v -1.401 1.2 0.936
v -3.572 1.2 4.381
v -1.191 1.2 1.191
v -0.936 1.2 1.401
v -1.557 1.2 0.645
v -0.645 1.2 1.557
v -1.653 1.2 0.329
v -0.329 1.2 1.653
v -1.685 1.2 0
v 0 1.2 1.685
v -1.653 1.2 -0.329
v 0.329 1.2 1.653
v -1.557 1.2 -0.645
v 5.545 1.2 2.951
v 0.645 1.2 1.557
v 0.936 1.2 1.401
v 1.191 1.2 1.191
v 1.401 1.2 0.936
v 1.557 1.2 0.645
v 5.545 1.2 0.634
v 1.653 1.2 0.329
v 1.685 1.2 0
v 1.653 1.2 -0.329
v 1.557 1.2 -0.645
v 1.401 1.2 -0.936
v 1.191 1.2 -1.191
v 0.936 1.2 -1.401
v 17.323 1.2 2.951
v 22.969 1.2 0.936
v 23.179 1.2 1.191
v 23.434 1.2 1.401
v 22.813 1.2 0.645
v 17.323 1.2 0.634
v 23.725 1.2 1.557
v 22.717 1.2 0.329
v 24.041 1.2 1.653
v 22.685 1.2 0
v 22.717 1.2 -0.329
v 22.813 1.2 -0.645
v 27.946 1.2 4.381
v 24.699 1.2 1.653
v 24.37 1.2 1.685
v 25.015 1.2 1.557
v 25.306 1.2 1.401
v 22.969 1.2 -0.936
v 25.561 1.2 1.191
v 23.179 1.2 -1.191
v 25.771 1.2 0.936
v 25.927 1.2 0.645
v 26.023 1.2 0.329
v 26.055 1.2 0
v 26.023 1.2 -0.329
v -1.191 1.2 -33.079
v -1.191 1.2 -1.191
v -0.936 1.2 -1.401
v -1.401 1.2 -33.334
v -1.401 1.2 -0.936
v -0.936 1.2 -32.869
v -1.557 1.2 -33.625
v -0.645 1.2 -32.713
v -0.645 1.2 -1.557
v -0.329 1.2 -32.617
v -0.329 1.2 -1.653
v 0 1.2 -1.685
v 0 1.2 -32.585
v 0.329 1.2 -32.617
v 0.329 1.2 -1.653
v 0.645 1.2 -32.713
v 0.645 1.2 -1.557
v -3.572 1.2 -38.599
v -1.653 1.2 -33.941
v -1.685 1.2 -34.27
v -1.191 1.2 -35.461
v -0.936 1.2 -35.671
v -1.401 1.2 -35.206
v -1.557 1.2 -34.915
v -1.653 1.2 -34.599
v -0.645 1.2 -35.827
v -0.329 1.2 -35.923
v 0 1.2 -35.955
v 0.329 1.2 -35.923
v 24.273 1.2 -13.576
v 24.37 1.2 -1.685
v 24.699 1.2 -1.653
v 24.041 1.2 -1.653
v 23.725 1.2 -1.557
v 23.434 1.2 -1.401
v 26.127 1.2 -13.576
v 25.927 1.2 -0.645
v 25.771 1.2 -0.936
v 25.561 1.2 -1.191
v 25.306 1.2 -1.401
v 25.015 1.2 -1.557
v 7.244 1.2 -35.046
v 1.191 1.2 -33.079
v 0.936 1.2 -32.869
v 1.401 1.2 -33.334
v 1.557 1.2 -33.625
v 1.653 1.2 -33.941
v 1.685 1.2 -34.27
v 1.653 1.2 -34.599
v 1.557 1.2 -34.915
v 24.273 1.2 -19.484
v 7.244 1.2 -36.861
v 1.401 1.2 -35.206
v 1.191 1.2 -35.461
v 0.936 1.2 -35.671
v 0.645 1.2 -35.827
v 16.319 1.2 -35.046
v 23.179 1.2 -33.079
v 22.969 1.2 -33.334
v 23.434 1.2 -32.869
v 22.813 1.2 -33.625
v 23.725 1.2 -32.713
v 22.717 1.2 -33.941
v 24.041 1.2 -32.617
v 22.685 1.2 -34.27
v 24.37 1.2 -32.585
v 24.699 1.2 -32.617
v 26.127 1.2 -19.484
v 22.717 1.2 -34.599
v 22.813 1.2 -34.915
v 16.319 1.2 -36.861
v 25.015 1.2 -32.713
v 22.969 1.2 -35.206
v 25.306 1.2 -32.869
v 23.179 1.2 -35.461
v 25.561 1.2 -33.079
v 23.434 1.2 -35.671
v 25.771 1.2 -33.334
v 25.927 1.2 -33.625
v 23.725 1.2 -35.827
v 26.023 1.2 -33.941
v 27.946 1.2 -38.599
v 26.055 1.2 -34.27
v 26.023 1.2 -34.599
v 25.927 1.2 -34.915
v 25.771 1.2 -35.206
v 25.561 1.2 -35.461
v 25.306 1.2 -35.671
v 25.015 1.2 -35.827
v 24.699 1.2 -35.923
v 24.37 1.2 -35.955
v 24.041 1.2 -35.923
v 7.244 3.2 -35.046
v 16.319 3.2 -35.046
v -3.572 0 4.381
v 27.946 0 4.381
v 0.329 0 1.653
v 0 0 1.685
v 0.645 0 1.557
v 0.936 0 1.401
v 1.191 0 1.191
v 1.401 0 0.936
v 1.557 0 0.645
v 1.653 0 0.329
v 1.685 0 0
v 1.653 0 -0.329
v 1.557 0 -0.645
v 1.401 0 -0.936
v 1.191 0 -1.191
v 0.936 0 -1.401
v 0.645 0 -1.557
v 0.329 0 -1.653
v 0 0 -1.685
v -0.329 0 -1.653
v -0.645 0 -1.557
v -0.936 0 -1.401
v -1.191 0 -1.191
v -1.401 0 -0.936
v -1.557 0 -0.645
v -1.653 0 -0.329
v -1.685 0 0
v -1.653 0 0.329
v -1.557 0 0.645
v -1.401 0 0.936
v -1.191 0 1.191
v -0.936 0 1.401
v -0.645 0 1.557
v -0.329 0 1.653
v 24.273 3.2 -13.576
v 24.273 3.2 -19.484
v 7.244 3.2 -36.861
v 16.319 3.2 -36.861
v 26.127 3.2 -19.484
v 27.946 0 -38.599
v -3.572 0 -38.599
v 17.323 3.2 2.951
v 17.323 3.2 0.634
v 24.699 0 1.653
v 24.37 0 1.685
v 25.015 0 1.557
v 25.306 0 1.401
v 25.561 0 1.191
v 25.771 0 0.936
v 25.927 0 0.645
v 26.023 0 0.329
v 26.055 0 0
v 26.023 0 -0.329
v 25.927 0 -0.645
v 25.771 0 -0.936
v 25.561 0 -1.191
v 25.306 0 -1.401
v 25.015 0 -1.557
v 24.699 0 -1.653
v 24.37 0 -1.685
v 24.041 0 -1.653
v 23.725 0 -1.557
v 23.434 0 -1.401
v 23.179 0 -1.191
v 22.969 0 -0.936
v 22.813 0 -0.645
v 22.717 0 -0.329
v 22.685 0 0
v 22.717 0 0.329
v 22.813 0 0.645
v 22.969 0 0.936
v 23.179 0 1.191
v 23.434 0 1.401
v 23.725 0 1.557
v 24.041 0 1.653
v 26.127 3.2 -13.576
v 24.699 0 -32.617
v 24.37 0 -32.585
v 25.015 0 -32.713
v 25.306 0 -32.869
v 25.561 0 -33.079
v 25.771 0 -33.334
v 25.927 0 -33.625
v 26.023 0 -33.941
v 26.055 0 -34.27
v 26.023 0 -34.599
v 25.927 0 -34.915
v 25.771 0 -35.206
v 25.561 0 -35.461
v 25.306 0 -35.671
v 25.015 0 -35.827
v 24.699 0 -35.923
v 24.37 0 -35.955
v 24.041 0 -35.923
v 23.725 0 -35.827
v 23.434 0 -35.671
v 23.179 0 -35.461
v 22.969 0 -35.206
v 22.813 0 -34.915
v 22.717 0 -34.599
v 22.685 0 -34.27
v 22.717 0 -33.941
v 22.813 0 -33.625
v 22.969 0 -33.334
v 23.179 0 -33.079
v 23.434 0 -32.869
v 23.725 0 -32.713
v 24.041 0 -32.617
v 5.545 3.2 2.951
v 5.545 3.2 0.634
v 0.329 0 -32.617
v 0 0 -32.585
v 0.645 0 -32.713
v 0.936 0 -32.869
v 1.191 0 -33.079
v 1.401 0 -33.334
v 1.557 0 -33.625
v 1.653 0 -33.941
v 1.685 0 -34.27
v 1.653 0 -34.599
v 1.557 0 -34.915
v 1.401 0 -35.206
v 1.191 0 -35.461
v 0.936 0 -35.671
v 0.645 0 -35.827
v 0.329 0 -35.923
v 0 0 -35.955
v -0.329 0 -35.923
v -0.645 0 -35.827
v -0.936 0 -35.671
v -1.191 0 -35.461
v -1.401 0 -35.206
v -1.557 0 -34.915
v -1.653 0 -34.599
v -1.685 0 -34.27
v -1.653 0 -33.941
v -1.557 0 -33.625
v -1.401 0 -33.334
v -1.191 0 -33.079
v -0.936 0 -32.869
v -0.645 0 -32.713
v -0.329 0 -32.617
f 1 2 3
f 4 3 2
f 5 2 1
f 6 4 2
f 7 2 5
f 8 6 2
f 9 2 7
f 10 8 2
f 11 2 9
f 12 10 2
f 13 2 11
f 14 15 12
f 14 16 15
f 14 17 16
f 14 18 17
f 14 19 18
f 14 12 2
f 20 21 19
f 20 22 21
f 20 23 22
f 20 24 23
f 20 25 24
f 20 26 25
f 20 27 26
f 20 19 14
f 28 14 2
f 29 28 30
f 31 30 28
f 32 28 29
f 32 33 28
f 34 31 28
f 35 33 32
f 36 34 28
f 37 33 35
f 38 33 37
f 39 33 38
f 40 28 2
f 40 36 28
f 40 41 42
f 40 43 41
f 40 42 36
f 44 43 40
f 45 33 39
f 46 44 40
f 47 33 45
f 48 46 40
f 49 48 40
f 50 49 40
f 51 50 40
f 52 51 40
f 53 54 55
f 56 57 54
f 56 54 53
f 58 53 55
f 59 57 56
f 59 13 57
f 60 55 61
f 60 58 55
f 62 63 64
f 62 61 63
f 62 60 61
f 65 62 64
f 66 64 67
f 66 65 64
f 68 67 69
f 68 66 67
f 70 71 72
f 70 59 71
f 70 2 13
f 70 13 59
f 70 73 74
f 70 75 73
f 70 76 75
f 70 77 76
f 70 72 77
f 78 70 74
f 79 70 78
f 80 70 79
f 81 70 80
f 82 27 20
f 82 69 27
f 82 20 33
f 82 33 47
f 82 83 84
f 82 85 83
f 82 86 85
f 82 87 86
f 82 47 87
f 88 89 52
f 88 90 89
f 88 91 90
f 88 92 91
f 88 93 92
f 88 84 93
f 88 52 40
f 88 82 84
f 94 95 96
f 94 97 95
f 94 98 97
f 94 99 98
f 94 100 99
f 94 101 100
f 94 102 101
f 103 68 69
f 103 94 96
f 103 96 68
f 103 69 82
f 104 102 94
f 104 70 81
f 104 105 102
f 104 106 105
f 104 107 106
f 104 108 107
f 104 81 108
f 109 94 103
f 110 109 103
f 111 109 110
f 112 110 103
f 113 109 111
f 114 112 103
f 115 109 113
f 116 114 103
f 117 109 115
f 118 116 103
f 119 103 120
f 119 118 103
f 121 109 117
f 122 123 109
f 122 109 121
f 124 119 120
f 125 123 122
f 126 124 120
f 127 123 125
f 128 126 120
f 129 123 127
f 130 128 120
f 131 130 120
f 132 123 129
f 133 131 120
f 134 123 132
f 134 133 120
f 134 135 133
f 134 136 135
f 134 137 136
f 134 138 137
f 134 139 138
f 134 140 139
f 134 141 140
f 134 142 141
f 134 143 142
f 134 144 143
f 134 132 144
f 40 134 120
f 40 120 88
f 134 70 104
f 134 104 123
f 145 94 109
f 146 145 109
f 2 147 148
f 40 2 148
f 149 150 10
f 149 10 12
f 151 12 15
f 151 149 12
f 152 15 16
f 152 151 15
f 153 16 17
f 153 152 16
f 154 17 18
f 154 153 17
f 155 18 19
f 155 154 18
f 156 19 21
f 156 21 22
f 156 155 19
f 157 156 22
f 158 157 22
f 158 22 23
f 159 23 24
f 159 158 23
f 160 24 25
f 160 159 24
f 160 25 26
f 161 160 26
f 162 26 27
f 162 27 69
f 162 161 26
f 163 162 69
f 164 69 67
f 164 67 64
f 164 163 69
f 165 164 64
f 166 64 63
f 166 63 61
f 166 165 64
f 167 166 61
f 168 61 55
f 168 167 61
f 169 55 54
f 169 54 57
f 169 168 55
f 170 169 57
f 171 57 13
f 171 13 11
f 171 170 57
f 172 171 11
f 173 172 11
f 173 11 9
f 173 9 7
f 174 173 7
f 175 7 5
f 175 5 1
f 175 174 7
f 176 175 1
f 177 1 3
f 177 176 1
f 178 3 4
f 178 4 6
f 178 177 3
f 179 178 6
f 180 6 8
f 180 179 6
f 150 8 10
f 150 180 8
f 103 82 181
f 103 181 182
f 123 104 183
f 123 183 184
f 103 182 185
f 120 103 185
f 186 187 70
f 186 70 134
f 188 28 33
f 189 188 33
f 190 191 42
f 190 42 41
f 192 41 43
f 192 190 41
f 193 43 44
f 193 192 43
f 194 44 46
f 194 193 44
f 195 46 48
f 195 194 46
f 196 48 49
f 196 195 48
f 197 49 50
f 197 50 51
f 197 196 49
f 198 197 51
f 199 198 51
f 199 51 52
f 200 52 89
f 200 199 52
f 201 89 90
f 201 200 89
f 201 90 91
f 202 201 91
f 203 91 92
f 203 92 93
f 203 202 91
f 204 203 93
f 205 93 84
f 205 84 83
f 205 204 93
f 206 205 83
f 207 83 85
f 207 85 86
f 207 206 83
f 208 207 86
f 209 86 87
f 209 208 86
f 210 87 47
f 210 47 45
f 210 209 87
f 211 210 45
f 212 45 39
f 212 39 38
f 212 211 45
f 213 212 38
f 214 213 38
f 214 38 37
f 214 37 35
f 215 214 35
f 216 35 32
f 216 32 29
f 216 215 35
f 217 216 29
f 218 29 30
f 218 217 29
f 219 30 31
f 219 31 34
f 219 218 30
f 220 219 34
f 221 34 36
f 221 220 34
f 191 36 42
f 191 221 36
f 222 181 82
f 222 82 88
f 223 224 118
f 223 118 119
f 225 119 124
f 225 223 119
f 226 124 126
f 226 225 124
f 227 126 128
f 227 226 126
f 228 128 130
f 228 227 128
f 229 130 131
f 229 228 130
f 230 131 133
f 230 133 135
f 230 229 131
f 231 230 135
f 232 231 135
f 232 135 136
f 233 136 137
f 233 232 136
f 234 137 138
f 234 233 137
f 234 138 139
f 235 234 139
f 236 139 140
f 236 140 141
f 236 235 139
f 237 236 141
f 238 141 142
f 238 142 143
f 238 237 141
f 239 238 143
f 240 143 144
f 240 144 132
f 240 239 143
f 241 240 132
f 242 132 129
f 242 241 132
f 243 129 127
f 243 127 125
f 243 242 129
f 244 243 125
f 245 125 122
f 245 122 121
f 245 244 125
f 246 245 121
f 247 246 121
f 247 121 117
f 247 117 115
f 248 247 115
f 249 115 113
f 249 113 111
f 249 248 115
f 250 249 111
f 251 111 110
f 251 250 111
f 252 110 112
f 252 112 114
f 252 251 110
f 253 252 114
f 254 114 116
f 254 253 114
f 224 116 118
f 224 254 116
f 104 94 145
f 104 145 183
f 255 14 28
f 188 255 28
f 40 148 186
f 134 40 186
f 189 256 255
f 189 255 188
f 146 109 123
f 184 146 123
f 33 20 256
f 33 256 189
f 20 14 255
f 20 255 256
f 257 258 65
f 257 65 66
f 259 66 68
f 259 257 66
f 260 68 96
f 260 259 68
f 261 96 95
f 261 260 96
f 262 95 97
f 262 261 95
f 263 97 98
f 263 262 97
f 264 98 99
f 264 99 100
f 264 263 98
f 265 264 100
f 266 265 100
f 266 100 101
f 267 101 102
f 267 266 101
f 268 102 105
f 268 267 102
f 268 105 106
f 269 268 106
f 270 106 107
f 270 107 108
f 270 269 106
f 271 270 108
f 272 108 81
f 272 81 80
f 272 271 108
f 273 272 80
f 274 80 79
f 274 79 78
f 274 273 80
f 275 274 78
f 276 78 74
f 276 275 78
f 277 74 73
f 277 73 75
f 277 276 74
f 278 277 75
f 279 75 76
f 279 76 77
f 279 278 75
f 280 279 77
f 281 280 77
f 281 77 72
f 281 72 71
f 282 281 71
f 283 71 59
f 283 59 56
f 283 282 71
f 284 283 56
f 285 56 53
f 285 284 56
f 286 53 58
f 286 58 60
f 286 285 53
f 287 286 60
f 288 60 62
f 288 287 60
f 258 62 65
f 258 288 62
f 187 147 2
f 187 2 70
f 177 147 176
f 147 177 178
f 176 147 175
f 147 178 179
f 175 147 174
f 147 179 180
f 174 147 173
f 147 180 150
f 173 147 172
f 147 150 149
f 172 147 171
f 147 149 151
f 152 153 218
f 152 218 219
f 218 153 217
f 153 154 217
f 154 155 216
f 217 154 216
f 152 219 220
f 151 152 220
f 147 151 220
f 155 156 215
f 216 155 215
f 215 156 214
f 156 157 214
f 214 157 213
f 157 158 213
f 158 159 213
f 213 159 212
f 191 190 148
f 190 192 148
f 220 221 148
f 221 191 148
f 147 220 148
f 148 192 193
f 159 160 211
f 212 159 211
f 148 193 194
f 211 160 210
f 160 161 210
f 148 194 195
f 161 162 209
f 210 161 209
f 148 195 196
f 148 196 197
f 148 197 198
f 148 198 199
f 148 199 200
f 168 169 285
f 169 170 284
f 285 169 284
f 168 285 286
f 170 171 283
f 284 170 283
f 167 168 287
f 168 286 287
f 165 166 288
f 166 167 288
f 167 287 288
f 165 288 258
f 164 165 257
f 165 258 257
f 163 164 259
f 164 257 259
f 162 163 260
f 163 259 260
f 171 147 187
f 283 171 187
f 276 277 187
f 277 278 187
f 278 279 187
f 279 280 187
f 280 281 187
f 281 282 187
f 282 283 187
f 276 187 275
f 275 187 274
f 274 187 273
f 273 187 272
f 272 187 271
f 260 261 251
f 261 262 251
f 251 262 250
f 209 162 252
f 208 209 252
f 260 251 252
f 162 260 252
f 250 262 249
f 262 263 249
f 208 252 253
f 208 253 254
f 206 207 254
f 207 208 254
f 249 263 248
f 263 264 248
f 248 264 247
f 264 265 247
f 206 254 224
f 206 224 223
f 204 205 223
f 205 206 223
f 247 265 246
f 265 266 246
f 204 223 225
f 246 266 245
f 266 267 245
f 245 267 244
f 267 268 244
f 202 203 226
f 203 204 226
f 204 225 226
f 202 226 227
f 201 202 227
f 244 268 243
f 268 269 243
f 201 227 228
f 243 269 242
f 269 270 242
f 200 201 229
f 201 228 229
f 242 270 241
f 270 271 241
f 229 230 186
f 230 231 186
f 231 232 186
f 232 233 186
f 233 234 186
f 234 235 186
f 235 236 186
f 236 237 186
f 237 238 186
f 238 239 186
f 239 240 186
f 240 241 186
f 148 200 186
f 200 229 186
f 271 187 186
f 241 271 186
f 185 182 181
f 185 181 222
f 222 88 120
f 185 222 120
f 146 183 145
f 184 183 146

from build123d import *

# Parameters (mm, degrees)
SKETCH1_W           = 31.518490379
SKETCH1_H           = 42.979759609
SKETCH1_R           = 1.685
BOSS_EXTRUDE1_DEPTH = 1.2
SKETCH2_W           = 9.074610473
SKETCH2_H           = 1.814922095
SKETCH2_W_2         = 1.853537458
SKETCH2_H_2         = 5.908150648
SKETCH2_W_3         = 11.777685933
SKETCH2_H_3         = 2.316921823
BOSS_EXTRUDE2_DEPTH = 2


with BuildPart() as part:
    # Sketch1 → Boss-Extrude1 (new body)
    with BuildSketch(Plane(origin=(0, 0, 0), x_dir=(1, 0, 0), z_dir=(0, 1, 0))):
        with Locations((12.186773079, 17.109376158)):
            Rectangle(SKETCH1_W, SKETCH1_H)
        with Locations(Location((0, 0, 0), (0, 0, 270))):
            Circle(SKETCH1_R, mode=Mode.SUBTRACT)
        with Locations(Location((24.37, 0, 0), (0, 0, 270))):
            Circle(SKETCH1_R, mode=Mode.SUBTRACT)
        with Locations(Location((24.37, 34.27, 0), (0, 0, 270))):
            Circle(SKETCH1_R, mode=Mode.SUBTRACT)
        with Locations(Location((0, 34.27, 0), (0, 0, 270))):
            Circle(SKETCH1_R, mode=Mode.SUBTRACT)
    extrude(amount=BOSS_EXTRUDE1_DEPTH)

    # Sketch2 → Boss-Extrude2 (add)
    with BuildSketch(Plane(origin=(0, 1.2, 0), x_dir=(1, 0, 0), z_dir=(0, 1, 0))):
        with Locations((11.781311759, 35.95367365)):
            Rectangle(SKETCH2_W, SKETCH2_H)
        with Locations((25.20015065, 16.530145702)):
            Rectangle(SKETCH2_W_2, SKETCH2_H_2)
        with Locations((11.433773487, -1.792844381)):
            Rectangle(SKETCH2_W_3, SKETCH2_H_3)
    extrude(amount=BOSS_EXTRUDE2_DEPTH)


solid = part.part
